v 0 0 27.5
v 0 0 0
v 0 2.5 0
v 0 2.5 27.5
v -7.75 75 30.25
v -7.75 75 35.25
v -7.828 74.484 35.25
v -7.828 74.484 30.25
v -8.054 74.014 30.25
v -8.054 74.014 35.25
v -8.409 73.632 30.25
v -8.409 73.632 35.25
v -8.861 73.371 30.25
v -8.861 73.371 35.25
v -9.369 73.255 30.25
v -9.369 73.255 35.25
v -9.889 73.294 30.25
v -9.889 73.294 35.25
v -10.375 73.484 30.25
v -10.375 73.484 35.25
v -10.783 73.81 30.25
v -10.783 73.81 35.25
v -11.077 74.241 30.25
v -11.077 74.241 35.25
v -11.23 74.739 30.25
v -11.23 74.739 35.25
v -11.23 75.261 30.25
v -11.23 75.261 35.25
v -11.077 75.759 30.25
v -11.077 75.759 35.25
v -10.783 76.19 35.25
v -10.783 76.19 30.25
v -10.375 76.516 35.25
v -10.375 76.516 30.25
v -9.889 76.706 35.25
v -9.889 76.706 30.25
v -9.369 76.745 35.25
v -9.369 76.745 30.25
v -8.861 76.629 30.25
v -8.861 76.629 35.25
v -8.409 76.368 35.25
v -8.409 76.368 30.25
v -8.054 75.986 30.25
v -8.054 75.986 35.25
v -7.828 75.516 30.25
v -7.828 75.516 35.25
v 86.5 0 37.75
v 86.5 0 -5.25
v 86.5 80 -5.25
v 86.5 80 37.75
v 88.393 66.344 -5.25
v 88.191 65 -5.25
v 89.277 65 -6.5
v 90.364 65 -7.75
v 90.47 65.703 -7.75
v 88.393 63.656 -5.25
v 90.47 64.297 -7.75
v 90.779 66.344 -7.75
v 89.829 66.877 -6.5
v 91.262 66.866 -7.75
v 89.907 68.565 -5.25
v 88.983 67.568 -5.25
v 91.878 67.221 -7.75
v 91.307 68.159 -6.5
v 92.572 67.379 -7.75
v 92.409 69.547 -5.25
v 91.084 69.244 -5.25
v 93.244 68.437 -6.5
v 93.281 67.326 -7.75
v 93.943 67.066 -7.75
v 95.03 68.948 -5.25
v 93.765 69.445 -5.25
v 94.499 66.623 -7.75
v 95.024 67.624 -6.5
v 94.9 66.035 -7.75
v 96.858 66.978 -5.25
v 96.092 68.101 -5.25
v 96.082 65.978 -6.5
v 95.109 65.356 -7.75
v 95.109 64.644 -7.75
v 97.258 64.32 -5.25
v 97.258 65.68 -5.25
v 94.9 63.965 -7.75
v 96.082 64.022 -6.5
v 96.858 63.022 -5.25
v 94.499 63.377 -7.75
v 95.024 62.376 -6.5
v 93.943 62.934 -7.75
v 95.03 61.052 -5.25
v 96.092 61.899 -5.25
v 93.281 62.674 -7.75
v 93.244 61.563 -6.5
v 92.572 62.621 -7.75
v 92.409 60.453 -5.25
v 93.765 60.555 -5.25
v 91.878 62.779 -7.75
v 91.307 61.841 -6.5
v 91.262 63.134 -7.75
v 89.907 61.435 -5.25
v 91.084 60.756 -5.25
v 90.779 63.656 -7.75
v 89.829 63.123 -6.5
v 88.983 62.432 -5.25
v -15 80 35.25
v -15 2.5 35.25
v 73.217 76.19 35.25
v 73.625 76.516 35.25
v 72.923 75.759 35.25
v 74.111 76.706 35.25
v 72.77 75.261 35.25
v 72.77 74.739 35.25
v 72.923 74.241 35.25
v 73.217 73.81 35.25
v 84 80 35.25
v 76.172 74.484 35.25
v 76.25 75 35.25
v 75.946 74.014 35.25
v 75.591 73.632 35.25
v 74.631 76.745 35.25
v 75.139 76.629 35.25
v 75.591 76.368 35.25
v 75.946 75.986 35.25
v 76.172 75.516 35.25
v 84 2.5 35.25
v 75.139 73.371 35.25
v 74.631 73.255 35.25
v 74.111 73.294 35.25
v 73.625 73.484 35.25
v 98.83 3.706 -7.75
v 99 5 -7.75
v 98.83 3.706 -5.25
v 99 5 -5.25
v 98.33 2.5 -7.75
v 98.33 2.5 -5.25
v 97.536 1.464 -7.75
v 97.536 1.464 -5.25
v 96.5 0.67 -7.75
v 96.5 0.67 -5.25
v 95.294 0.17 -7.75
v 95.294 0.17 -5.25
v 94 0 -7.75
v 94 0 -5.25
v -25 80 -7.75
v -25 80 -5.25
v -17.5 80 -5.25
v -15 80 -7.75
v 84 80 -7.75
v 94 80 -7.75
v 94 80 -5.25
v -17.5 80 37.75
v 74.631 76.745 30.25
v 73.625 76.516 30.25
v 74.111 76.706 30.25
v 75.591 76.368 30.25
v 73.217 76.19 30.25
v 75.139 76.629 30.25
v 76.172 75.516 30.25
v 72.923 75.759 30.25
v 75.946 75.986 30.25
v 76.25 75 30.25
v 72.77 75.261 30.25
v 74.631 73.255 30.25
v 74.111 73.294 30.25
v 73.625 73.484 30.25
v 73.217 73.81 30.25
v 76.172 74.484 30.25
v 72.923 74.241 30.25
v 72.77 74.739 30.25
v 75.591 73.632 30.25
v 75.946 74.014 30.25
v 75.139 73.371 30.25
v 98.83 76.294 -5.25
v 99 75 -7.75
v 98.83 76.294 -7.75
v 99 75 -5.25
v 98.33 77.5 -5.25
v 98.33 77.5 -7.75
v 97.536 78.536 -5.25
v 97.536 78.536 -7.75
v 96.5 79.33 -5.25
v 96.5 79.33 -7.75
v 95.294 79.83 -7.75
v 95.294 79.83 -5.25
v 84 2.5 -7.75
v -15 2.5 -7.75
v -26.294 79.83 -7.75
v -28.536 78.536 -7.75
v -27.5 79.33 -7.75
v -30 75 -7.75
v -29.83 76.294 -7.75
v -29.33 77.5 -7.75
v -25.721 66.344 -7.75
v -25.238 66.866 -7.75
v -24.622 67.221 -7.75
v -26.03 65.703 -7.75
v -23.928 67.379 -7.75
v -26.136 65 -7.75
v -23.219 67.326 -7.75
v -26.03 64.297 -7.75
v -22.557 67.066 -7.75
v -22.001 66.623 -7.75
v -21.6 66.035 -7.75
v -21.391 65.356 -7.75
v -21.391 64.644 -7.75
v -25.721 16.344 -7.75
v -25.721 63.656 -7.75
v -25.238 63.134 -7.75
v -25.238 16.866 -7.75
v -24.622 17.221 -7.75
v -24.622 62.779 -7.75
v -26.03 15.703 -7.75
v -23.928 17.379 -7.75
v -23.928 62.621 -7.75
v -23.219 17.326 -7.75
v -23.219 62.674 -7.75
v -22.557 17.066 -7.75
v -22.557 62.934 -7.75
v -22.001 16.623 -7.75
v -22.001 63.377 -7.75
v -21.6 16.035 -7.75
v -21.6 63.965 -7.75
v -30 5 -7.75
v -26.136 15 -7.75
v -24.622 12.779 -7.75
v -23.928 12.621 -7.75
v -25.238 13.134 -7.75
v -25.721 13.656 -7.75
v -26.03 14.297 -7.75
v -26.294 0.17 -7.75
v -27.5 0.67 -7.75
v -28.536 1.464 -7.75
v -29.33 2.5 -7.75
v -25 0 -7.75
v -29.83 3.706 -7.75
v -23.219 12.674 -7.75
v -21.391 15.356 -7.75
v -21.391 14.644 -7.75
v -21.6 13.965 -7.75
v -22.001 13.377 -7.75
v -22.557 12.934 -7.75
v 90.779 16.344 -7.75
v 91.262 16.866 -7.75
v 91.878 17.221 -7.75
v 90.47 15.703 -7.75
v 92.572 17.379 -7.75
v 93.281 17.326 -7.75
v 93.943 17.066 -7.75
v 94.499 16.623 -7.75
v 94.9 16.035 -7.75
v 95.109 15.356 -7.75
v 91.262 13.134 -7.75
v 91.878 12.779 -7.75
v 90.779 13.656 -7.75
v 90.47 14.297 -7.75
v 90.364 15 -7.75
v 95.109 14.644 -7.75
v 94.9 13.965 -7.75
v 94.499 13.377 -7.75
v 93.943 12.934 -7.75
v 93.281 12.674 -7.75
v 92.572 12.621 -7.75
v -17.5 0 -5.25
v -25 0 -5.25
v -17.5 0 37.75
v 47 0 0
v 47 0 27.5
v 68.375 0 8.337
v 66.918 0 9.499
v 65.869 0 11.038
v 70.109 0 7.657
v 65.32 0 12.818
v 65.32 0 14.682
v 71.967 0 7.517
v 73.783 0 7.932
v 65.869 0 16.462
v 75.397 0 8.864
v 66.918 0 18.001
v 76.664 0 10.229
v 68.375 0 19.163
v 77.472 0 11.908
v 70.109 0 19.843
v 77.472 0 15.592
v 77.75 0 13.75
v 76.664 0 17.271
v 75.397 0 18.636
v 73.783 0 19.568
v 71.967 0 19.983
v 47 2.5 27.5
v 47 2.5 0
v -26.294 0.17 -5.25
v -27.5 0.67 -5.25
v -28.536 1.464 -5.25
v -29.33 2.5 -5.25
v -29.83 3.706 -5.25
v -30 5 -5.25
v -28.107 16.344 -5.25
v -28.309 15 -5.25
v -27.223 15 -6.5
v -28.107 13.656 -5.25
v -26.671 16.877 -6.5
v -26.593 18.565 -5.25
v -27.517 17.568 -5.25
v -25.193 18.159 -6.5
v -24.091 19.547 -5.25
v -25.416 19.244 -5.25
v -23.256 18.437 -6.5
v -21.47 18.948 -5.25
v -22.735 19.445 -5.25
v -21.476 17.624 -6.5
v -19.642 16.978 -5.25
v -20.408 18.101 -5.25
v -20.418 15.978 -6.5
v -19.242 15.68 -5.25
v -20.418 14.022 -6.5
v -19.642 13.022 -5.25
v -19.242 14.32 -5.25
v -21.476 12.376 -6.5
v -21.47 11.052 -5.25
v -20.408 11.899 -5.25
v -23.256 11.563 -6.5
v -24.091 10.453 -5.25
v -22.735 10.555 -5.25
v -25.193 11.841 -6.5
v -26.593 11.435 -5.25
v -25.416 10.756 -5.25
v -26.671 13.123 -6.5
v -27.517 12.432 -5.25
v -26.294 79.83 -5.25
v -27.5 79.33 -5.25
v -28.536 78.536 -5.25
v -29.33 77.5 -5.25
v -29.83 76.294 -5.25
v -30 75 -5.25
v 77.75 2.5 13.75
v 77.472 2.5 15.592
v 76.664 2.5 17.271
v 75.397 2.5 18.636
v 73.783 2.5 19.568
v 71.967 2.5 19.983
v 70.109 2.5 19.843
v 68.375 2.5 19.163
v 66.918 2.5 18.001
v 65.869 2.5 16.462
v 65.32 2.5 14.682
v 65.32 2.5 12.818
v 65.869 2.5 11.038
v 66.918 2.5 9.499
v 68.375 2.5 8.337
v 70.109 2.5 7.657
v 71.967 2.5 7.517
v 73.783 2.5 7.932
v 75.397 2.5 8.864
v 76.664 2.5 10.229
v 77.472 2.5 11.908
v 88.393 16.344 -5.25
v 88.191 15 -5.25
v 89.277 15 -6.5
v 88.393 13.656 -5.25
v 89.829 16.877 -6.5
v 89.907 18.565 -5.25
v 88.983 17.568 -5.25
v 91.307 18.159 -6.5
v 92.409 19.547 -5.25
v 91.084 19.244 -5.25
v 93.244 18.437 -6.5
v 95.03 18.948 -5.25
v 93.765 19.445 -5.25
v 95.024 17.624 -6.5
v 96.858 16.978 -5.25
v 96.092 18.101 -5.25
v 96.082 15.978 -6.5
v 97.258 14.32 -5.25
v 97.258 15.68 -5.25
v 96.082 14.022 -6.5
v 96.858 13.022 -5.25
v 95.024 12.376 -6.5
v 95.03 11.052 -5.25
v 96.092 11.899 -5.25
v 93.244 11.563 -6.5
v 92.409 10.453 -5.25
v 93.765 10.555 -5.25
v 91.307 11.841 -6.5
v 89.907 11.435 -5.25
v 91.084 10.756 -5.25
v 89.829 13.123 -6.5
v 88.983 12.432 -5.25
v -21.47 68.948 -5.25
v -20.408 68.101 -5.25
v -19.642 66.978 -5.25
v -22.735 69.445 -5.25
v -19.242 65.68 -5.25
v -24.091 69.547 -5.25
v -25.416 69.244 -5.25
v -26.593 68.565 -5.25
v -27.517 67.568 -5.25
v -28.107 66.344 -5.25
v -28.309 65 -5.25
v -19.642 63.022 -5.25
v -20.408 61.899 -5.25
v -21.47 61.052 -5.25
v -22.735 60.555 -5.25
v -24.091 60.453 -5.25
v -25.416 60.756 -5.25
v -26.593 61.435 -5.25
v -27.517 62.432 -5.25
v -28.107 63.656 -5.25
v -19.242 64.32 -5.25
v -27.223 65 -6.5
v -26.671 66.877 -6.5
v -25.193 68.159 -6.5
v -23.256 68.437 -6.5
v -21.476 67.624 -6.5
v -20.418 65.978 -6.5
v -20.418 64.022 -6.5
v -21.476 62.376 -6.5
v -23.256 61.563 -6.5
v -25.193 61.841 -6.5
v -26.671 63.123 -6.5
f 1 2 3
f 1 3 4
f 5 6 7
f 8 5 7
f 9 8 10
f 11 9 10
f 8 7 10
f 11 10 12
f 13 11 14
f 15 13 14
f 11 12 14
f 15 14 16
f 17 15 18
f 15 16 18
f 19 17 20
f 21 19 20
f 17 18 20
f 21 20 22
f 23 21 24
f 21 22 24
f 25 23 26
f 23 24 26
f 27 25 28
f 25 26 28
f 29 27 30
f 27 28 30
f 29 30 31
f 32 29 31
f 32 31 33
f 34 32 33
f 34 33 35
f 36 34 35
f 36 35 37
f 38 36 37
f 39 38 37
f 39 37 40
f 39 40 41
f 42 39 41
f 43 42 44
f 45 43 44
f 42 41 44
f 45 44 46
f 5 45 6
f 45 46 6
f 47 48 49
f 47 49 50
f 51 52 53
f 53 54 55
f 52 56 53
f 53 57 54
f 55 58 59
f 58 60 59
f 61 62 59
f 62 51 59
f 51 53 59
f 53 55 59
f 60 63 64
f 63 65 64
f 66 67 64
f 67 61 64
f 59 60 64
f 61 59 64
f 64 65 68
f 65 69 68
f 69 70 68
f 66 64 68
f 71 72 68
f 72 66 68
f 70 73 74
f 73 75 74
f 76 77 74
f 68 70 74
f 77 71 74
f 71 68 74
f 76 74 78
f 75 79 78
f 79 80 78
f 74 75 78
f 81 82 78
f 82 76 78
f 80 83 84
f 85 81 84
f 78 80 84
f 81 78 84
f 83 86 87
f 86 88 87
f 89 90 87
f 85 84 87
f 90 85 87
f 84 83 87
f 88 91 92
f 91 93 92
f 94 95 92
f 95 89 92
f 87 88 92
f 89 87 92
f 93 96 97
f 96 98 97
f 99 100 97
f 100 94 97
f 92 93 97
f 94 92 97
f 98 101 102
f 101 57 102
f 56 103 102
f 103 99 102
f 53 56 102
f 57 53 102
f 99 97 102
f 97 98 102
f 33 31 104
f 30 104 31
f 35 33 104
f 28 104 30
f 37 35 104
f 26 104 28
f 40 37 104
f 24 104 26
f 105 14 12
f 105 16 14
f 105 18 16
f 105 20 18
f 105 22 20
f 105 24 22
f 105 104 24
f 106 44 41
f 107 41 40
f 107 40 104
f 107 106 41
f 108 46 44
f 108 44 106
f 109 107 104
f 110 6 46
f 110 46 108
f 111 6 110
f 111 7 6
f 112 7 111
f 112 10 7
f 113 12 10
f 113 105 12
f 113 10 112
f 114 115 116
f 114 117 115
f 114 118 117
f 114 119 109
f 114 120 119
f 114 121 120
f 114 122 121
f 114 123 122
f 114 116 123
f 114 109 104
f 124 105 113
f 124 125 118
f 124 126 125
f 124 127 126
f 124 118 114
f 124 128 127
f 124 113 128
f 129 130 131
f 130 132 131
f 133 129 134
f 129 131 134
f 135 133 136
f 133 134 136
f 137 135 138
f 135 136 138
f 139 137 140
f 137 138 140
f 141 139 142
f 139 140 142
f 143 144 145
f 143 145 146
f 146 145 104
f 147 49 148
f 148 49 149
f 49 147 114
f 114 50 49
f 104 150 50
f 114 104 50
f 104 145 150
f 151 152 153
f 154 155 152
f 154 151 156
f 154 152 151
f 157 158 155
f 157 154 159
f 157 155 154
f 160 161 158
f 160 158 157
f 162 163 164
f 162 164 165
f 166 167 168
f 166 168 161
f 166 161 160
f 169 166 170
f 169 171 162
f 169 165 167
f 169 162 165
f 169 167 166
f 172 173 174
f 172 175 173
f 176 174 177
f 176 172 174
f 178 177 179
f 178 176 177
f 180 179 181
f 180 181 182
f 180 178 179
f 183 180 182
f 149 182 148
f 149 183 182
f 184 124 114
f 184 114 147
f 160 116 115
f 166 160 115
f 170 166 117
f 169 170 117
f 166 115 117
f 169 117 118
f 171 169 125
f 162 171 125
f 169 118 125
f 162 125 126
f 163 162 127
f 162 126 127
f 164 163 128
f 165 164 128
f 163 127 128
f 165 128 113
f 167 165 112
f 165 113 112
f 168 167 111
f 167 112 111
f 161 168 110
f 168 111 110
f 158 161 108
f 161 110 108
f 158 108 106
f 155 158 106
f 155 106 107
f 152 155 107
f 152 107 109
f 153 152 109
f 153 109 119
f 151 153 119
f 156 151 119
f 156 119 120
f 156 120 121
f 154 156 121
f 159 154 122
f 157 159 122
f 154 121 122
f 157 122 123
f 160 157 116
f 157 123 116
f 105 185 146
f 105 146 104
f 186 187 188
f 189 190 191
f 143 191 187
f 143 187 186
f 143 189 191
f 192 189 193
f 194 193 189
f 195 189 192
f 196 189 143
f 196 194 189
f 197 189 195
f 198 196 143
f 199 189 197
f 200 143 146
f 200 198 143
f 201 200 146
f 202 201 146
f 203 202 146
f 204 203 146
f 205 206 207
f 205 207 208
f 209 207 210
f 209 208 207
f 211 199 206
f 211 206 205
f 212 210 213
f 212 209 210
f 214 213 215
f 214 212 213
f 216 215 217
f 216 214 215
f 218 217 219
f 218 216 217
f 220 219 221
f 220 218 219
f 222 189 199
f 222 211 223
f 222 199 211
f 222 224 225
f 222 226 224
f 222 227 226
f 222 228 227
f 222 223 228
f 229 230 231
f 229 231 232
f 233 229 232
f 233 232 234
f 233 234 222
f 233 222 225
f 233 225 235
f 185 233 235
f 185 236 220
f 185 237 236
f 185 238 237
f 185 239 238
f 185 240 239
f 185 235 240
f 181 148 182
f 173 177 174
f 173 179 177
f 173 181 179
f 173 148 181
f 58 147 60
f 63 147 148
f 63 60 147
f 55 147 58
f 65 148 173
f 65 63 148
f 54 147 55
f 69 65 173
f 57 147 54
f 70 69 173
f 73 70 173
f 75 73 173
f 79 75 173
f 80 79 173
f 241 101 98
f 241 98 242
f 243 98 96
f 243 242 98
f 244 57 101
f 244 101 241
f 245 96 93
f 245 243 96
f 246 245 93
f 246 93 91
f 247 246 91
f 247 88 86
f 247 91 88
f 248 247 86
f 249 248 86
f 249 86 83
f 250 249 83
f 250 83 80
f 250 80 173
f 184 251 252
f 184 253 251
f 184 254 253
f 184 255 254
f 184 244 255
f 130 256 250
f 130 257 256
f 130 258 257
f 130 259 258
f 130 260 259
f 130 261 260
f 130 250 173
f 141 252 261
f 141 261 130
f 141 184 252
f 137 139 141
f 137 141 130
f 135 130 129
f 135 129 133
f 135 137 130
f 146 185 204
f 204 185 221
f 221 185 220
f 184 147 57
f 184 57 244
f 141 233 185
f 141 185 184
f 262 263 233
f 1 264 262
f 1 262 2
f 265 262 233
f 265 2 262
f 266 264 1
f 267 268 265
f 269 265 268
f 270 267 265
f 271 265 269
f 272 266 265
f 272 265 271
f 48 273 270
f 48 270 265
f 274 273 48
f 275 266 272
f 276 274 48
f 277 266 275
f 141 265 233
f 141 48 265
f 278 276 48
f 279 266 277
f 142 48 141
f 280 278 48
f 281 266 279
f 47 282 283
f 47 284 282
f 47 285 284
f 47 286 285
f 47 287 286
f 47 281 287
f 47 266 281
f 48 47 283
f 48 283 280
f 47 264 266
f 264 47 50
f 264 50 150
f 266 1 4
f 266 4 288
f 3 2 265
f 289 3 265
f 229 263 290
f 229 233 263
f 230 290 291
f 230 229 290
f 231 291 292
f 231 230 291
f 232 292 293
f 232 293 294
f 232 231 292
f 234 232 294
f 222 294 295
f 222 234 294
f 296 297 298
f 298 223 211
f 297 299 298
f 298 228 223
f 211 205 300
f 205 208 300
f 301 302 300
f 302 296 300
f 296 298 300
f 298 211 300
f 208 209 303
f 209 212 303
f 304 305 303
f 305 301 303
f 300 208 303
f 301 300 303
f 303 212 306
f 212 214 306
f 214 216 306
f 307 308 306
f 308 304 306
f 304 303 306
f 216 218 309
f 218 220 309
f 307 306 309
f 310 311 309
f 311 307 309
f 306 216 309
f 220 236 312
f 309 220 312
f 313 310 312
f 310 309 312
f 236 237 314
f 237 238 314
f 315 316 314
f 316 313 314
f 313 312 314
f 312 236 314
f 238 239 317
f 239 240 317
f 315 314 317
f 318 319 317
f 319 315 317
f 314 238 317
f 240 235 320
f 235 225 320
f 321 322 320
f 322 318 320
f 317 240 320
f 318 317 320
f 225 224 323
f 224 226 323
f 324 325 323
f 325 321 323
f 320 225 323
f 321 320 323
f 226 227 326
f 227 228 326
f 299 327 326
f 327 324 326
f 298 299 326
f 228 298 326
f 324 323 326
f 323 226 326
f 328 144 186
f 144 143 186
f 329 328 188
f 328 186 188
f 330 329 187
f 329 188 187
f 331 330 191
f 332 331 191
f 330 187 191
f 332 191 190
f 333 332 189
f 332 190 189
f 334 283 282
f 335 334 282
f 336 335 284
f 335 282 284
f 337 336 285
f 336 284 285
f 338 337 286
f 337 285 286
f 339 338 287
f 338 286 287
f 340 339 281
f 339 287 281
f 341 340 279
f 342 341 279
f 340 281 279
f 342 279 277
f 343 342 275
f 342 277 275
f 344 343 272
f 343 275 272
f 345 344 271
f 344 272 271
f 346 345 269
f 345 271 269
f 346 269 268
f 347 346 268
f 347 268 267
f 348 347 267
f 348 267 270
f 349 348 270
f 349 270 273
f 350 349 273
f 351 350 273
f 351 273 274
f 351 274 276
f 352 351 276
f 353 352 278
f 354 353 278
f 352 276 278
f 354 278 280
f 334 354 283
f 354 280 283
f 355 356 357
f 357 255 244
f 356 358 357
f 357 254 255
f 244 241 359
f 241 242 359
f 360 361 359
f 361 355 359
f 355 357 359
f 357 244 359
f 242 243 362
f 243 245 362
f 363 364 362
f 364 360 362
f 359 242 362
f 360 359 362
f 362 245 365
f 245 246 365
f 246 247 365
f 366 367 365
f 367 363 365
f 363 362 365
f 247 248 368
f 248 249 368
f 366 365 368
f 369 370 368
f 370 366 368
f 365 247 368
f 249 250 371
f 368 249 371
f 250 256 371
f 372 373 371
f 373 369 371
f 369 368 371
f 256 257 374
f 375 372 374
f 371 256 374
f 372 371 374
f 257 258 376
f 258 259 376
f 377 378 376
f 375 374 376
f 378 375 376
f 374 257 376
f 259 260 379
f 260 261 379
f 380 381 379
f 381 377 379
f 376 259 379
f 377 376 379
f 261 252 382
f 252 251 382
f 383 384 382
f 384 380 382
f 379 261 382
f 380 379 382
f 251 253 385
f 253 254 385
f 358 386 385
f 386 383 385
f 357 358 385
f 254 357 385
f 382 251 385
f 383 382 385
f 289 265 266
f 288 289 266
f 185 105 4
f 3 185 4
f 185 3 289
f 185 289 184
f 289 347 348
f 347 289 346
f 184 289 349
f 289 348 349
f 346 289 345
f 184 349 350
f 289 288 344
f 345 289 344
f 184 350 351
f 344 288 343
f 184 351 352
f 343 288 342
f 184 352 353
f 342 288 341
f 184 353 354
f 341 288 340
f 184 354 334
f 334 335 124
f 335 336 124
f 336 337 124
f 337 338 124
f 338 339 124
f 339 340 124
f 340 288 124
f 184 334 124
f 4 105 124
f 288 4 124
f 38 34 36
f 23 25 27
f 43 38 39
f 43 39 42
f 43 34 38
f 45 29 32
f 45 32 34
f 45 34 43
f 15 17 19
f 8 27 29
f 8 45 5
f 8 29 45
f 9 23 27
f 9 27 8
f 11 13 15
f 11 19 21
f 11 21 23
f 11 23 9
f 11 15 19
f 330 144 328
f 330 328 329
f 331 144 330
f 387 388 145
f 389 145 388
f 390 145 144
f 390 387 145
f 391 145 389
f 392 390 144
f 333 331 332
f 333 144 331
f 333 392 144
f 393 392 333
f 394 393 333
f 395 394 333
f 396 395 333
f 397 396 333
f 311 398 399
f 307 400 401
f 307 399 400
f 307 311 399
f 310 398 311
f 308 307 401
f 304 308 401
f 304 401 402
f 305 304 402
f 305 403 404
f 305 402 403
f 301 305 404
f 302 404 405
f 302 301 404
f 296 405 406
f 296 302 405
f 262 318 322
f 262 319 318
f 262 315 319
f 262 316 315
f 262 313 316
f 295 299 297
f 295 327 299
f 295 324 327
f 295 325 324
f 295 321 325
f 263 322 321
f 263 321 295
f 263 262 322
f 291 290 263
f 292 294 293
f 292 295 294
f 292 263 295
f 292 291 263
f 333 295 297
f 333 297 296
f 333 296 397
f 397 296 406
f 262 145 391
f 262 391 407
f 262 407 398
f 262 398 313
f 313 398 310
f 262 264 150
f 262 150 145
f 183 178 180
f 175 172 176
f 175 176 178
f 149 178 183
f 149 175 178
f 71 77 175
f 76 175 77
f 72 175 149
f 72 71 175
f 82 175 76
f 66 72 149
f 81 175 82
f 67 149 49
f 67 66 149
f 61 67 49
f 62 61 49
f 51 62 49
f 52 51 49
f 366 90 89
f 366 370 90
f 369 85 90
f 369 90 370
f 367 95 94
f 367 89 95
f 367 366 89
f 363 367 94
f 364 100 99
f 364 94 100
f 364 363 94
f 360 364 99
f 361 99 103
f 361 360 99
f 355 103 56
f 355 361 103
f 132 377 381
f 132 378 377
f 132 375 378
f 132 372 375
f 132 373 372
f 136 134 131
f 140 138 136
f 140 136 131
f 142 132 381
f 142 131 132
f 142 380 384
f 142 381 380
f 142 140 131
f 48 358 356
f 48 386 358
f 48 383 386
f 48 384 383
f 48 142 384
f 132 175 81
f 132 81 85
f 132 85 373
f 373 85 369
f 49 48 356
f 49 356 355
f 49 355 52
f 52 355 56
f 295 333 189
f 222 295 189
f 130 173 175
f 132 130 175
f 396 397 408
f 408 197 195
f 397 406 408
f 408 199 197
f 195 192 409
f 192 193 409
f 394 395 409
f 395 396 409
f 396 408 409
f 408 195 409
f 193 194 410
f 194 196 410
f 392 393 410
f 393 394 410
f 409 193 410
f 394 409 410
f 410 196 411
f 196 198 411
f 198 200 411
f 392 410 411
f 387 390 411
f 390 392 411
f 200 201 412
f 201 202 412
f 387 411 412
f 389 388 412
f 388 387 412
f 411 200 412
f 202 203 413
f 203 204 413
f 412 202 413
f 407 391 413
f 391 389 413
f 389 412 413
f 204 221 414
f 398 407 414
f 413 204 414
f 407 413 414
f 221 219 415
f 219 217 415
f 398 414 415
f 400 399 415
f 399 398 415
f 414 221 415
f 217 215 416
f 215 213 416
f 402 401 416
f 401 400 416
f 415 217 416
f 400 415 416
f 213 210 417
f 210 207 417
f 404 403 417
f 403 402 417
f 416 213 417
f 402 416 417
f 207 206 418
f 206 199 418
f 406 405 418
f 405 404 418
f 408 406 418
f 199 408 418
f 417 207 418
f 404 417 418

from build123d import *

# Parameters (mm, degrees)
F1_DEPTH       = 80
F0_W           = 99
F0_H           = 43
F0_W_2         = 47
F0_H_2         = 27.5
F0_R           = 6.25
F2_DEPTH       = 2.5
F4_D           = 4.4958
F4_CSINK_D     = 9.1186
F4_CSINK_ANGLE = 82
F5_R           = 5
F6_R           = 1.75
F7_DEPTH       = 5


with BuildPart() as f1:
    # F0 (on Front) → F1 (new body)
    with BuildSketch(Plane.XZ):
        Polygon((-15, -7.75), (-15, 35.25), (84, 35.25), (84, -7.75), (99, -7.75), (99, -5.25), (86.5, -5.25), (86.5, 37.75), (-17.5, 37.75), (-17.5, -5.25), (-30, -5.25), (-30, -7.75), align=None)
    extrude(amount=-F1_DEPTH)

    # F0 (on Front) → F2 (join)
    with BuildSketch(Plane.XZ):
        with Locations((34.5, 13.75)):
            Rectangle(F0_W, F0_H)
        with Locations((23.5, 13.75)):
            Rectangle(F0_W_2, F0_H_2, mode=Mode.SUBTRACT)
        with Locations((71.5, 13.75)):
            Circle(F0_R, mode=Mode.SUBTRACT)
    extrude(amount=-F2_DEPTH)

    # F4 (through all)
    with Locations(Plane.XY.offset(-5.25)):
        with Locations((-23.75, 65), (-23.75, 15), (92.75, 15), (92.75, 65)):
            CounterSinkHole(F4_D / 2, F4_CSINK_D / 2, counter_sink_angle=F4_CSINK_ANGLE)

    # F5
    f5_edges = [f1.edges().sort_by_distance(p)[0] for p in [
        (99, 0, -6.5),
        (-30, 0, -6.5),
        (99, 80, -6.5),
        (-30, 80, -6.5),
    ]]
    fillet(f5_edges, radius=F5_R)

    # F6 (on face) → F7 (join)
    with BuildSketch(Plane(origin=(0, 0, 35.25), x_dir=(1, 0, 0), z_dir=(0, 0, -1))):
        with Locations((-9.5, -75)):
            Circle(F6_R)
        with Locations((74.5, -75)):
            Circle(F6_R)
    extrude(amount=F7_DEPTH)


solid = f1.part
